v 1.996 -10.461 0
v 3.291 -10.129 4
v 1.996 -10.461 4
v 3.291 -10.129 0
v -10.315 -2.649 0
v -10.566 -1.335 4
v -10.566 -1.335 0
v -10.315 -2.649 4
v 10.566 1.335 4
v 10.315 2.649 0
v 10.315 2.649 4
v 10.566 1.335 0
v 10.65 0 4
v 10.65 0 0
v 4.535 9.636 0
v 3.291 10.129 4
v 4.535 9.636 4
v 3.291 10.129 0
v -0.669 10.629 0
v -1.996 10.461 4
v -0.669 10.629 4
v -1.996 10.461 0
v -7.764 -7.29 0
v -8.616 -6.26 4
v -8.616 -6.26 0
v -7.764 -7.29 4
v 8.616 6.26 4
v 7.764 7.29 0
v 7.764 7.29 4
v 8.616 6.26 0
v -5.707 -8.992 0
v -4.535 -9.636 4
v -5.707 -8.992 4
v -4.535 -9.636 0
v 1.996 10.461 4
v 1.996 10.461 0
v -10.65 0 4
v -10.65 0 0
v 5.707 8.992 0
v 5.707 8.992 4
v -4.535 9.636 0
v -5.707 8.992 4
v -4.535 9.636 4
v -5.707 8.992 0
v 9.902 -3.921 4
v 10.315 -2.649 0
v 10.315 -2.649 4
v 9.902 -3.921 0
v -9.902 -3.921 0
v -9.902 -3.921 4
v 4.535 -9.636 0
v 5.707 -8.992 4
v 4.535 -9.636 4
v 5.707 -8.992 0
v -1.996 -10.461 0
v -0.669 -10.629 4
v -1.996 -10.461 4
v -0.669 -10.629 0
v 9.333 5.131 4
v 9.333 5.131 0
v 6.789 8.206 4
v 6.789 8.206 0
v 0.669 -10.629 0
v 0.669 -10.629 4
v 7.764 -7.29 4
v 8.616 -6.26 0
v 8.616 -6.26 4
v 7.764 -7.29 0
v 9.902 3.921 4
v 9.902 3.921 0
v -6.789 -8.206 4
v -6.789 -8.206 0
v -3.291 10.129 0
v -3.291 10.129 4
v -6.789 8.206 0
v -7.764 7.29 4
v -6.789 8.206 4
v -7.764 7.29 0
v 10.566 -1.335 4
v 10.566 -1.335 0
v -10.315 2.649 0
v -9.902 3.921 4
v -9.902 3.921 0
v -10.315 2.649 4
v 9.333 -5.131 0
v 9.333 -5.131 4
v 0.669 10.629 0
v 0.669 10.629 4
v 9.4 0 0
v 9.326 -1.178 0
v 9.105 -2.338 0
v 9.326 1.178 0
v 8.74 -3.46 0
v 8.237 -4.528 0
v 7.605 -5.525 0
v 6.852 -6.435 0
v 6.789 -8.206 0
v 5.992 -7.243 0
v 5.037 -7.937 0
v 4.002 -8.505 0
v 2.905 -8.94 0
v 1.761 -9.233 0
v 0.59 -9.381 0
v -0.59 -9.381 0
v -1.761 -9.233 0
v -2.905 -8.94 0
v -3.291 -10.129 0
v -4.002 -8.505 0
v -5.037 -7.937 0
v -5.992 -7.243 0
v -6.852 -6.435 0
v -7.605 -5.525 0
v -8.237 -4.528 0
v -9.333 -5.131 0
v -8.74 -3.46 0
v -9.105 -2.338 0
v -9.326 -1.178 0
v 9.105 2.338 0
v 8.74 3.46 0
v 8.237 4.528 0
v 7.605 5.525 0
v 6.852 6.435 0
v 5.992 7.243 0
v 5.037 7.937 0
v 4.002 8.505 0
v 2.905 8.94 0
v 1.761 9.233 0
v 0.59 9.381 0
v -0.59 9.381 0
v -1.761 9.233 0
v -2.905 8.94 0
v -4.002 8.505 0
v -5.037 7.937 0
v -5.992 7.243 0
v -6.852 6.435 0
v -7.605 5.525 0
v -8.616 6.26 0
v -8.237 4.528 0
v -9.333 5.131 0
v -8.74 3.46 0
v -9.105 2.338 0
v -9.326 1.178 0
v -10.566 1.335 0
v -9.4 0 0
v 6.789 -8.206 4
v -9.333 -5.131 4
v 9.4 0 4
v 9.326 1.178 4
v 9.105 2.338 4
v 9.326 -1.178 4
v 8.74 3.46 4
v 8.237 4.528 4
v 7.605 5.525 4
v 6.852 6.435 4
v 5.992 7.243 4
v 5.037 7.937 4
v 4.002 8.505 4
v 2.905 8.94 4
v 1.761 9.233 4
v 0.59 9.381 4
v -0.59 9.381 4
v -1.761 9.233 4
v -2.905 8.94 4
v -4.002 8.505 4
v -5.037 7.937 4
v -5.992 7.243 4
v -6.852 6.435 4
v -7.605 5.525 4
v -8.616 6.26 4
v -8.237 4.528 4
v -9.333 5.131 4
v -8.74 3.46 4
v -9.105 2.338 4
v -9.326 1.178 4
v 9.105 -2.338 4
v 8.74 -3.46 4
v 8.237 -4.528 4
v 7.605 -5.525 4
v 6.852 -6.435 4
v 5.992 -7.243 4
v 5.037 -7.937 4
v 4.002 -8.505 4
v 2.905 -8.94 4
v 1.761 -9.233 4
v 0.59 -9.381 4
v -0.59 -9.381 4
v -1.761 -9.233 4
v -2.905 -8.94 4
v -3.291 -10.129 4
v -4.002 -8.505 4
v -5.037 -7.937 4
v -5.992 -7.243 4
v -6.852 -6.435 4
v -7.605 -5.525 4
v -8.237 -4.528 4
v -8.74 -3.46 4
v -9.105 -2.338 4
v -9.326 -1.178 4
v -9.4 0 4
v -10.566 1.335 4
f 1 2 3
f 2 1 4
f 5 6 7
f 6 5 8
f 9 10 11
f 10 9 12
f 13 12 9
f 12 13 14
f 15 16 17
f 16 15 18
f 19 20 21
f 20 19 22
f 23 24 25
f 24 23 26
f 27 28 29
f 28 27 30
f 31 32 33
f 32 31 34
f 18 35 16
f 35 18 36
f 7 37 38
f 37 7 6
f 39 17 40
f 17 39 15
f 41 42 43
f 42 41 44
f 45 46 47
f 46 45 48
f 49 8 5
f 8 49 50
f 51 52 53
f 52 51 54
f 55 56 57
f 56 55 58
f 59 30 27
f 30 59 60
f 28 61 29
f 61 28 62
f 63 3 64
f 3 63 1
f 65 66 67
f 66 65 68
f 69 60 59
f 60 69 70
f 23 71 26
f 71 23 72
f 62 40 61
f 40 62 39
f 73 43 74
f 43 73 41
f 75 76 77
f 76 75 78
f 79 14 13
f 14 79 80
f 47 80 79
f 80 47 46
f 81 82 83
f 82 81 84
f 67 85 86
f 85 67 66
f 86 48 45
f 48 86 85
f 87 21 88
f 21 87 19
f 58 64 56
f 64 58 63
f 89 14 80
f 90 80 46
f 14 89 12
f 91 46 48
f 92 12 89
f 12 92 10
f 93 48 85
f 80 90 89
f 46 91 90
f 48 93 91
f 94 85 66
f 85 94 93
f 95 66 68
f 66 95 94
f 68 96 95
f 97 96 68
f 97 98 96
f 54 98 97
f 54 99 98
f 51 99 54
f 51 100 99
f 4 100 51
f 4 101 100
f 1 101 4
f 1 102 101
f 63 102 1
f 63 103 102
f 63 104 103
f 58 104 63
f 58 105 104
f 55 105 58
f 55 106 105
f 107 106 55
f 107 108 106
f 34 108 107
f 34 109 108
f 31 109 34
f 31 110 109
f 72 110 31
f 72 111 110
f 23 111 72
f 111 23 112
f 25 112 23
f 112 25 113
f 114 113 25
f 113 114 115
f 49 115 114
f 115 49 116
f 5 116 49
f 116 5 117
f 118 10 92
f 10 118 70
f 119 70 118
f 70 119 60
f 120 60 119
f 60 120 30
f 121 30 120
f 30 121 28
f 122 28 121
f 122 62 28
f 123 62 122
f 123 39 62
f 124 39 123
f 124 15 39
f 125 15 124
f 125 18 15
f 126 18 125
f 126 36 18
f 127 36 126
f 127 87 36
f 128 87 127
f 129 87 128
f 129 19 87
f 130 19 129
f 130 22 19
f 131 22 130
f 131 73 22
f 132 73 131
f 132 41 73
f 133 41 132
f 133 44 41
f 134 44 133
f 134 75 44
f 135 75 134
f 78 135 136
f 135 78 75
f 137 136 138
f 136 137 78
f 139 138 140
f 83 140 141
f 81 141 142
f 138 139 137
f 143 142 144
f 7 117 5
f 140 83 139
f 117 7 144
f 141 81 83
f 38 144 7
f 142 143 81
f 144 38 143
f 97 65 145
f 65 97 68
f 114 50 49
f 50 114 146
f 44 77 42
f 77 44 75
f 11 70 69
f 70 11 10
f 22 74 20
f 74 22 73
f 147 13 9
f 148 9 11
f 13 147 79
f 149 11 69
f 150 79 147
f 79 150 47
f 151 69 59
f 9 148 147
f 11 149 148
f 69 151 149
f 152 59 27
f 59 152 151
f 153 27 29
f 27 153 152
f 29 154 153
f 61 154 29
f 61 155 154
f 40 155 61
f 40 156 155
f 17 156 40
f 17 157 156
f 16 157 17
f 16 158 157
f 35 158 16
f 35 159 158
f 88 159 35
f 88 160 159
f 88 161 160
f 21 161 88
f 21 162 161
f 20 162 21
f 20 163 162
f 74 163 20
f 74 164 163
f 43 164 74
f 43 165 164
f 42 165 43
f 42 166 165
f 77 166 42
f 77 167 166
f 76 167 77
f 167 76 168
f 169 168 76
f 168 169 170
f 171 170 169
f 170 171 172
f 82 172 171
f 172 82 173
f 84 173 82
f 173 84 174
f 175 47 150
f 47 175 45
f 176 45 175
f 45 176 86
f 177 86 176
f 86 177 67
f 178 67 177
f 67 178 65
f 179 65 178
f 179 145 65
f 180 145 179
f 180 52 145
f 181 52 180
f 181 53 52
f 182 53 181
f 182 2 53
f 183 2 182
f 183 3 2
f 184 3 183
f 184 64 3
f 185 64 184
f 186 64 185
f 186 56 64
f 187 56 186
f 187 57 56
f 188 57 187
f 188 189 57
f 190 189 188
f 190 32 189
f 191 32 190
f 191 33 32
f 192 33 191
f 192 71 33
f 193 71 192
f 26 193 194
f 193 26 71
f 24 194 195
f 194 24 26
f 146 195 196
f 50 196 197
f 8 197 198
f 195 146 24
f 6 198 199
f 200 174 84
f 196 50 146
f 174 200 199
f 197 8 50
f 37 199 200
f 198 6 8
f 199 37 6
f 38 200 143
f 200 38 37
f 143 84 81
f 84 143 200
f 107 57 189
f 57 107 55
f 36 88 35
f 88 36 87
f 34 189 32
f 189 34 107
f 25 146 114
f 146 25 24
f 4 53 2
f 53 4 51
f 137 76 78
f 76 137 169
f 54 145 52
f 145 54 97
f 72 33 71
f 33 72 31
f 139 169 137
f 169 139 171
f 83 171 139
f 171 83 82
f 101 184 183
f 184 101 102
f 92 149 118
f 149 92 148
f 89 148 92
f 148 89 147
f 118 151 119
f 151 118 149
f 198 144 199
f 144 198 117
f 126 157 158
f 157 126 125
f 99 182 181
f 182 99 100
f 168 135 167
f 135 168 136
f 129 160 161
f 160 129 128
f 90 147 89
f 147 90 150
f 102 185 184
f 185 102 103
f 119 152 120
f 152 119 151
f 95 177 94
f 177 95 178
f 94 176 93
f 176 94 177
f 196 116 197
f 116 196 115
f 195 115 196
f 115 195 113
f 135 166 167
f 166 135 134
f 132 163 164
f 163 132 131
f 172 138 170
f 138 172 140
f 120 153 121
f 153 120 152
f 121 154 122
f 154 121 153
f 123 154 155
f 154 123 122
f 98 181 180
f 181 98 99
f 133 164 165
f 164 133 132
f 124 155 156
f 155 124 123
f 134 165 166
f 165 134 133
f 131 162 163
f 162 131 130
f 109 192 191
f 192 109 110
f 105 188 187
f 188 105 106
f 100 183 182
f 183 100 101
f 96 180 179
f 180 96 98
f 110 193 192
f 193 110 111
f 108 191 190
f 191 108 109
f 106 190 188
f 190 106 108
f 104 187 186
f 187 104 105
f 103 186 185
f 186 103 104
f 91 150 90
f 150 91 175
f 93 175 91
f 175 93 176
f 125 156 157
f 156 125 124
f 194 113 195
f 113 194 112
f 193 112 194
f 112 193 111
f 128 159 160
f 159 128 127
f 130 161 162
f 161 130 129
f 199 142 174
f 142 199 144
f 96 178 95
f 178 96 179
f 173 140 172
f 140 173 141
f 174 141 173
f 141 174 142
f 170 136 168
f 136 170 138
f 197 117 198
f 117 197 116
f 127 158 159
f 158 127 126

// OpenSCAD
// holder for M6 bearing - test
$fn = 50;

ov = 0.05;
w = 2.5;
d_in = 6.0; // unnused
d_o  = 18.8;
d_o1 = d_o + w;
// h_b  = 6.0;
h_b  = 4.0; // pre-test

difference() {
  cylinder( d = d_o1, h = h_b );
  translate( [0,0,-ov] ) cylinder( d = d_o, h = h_b + 2*ov );
}
